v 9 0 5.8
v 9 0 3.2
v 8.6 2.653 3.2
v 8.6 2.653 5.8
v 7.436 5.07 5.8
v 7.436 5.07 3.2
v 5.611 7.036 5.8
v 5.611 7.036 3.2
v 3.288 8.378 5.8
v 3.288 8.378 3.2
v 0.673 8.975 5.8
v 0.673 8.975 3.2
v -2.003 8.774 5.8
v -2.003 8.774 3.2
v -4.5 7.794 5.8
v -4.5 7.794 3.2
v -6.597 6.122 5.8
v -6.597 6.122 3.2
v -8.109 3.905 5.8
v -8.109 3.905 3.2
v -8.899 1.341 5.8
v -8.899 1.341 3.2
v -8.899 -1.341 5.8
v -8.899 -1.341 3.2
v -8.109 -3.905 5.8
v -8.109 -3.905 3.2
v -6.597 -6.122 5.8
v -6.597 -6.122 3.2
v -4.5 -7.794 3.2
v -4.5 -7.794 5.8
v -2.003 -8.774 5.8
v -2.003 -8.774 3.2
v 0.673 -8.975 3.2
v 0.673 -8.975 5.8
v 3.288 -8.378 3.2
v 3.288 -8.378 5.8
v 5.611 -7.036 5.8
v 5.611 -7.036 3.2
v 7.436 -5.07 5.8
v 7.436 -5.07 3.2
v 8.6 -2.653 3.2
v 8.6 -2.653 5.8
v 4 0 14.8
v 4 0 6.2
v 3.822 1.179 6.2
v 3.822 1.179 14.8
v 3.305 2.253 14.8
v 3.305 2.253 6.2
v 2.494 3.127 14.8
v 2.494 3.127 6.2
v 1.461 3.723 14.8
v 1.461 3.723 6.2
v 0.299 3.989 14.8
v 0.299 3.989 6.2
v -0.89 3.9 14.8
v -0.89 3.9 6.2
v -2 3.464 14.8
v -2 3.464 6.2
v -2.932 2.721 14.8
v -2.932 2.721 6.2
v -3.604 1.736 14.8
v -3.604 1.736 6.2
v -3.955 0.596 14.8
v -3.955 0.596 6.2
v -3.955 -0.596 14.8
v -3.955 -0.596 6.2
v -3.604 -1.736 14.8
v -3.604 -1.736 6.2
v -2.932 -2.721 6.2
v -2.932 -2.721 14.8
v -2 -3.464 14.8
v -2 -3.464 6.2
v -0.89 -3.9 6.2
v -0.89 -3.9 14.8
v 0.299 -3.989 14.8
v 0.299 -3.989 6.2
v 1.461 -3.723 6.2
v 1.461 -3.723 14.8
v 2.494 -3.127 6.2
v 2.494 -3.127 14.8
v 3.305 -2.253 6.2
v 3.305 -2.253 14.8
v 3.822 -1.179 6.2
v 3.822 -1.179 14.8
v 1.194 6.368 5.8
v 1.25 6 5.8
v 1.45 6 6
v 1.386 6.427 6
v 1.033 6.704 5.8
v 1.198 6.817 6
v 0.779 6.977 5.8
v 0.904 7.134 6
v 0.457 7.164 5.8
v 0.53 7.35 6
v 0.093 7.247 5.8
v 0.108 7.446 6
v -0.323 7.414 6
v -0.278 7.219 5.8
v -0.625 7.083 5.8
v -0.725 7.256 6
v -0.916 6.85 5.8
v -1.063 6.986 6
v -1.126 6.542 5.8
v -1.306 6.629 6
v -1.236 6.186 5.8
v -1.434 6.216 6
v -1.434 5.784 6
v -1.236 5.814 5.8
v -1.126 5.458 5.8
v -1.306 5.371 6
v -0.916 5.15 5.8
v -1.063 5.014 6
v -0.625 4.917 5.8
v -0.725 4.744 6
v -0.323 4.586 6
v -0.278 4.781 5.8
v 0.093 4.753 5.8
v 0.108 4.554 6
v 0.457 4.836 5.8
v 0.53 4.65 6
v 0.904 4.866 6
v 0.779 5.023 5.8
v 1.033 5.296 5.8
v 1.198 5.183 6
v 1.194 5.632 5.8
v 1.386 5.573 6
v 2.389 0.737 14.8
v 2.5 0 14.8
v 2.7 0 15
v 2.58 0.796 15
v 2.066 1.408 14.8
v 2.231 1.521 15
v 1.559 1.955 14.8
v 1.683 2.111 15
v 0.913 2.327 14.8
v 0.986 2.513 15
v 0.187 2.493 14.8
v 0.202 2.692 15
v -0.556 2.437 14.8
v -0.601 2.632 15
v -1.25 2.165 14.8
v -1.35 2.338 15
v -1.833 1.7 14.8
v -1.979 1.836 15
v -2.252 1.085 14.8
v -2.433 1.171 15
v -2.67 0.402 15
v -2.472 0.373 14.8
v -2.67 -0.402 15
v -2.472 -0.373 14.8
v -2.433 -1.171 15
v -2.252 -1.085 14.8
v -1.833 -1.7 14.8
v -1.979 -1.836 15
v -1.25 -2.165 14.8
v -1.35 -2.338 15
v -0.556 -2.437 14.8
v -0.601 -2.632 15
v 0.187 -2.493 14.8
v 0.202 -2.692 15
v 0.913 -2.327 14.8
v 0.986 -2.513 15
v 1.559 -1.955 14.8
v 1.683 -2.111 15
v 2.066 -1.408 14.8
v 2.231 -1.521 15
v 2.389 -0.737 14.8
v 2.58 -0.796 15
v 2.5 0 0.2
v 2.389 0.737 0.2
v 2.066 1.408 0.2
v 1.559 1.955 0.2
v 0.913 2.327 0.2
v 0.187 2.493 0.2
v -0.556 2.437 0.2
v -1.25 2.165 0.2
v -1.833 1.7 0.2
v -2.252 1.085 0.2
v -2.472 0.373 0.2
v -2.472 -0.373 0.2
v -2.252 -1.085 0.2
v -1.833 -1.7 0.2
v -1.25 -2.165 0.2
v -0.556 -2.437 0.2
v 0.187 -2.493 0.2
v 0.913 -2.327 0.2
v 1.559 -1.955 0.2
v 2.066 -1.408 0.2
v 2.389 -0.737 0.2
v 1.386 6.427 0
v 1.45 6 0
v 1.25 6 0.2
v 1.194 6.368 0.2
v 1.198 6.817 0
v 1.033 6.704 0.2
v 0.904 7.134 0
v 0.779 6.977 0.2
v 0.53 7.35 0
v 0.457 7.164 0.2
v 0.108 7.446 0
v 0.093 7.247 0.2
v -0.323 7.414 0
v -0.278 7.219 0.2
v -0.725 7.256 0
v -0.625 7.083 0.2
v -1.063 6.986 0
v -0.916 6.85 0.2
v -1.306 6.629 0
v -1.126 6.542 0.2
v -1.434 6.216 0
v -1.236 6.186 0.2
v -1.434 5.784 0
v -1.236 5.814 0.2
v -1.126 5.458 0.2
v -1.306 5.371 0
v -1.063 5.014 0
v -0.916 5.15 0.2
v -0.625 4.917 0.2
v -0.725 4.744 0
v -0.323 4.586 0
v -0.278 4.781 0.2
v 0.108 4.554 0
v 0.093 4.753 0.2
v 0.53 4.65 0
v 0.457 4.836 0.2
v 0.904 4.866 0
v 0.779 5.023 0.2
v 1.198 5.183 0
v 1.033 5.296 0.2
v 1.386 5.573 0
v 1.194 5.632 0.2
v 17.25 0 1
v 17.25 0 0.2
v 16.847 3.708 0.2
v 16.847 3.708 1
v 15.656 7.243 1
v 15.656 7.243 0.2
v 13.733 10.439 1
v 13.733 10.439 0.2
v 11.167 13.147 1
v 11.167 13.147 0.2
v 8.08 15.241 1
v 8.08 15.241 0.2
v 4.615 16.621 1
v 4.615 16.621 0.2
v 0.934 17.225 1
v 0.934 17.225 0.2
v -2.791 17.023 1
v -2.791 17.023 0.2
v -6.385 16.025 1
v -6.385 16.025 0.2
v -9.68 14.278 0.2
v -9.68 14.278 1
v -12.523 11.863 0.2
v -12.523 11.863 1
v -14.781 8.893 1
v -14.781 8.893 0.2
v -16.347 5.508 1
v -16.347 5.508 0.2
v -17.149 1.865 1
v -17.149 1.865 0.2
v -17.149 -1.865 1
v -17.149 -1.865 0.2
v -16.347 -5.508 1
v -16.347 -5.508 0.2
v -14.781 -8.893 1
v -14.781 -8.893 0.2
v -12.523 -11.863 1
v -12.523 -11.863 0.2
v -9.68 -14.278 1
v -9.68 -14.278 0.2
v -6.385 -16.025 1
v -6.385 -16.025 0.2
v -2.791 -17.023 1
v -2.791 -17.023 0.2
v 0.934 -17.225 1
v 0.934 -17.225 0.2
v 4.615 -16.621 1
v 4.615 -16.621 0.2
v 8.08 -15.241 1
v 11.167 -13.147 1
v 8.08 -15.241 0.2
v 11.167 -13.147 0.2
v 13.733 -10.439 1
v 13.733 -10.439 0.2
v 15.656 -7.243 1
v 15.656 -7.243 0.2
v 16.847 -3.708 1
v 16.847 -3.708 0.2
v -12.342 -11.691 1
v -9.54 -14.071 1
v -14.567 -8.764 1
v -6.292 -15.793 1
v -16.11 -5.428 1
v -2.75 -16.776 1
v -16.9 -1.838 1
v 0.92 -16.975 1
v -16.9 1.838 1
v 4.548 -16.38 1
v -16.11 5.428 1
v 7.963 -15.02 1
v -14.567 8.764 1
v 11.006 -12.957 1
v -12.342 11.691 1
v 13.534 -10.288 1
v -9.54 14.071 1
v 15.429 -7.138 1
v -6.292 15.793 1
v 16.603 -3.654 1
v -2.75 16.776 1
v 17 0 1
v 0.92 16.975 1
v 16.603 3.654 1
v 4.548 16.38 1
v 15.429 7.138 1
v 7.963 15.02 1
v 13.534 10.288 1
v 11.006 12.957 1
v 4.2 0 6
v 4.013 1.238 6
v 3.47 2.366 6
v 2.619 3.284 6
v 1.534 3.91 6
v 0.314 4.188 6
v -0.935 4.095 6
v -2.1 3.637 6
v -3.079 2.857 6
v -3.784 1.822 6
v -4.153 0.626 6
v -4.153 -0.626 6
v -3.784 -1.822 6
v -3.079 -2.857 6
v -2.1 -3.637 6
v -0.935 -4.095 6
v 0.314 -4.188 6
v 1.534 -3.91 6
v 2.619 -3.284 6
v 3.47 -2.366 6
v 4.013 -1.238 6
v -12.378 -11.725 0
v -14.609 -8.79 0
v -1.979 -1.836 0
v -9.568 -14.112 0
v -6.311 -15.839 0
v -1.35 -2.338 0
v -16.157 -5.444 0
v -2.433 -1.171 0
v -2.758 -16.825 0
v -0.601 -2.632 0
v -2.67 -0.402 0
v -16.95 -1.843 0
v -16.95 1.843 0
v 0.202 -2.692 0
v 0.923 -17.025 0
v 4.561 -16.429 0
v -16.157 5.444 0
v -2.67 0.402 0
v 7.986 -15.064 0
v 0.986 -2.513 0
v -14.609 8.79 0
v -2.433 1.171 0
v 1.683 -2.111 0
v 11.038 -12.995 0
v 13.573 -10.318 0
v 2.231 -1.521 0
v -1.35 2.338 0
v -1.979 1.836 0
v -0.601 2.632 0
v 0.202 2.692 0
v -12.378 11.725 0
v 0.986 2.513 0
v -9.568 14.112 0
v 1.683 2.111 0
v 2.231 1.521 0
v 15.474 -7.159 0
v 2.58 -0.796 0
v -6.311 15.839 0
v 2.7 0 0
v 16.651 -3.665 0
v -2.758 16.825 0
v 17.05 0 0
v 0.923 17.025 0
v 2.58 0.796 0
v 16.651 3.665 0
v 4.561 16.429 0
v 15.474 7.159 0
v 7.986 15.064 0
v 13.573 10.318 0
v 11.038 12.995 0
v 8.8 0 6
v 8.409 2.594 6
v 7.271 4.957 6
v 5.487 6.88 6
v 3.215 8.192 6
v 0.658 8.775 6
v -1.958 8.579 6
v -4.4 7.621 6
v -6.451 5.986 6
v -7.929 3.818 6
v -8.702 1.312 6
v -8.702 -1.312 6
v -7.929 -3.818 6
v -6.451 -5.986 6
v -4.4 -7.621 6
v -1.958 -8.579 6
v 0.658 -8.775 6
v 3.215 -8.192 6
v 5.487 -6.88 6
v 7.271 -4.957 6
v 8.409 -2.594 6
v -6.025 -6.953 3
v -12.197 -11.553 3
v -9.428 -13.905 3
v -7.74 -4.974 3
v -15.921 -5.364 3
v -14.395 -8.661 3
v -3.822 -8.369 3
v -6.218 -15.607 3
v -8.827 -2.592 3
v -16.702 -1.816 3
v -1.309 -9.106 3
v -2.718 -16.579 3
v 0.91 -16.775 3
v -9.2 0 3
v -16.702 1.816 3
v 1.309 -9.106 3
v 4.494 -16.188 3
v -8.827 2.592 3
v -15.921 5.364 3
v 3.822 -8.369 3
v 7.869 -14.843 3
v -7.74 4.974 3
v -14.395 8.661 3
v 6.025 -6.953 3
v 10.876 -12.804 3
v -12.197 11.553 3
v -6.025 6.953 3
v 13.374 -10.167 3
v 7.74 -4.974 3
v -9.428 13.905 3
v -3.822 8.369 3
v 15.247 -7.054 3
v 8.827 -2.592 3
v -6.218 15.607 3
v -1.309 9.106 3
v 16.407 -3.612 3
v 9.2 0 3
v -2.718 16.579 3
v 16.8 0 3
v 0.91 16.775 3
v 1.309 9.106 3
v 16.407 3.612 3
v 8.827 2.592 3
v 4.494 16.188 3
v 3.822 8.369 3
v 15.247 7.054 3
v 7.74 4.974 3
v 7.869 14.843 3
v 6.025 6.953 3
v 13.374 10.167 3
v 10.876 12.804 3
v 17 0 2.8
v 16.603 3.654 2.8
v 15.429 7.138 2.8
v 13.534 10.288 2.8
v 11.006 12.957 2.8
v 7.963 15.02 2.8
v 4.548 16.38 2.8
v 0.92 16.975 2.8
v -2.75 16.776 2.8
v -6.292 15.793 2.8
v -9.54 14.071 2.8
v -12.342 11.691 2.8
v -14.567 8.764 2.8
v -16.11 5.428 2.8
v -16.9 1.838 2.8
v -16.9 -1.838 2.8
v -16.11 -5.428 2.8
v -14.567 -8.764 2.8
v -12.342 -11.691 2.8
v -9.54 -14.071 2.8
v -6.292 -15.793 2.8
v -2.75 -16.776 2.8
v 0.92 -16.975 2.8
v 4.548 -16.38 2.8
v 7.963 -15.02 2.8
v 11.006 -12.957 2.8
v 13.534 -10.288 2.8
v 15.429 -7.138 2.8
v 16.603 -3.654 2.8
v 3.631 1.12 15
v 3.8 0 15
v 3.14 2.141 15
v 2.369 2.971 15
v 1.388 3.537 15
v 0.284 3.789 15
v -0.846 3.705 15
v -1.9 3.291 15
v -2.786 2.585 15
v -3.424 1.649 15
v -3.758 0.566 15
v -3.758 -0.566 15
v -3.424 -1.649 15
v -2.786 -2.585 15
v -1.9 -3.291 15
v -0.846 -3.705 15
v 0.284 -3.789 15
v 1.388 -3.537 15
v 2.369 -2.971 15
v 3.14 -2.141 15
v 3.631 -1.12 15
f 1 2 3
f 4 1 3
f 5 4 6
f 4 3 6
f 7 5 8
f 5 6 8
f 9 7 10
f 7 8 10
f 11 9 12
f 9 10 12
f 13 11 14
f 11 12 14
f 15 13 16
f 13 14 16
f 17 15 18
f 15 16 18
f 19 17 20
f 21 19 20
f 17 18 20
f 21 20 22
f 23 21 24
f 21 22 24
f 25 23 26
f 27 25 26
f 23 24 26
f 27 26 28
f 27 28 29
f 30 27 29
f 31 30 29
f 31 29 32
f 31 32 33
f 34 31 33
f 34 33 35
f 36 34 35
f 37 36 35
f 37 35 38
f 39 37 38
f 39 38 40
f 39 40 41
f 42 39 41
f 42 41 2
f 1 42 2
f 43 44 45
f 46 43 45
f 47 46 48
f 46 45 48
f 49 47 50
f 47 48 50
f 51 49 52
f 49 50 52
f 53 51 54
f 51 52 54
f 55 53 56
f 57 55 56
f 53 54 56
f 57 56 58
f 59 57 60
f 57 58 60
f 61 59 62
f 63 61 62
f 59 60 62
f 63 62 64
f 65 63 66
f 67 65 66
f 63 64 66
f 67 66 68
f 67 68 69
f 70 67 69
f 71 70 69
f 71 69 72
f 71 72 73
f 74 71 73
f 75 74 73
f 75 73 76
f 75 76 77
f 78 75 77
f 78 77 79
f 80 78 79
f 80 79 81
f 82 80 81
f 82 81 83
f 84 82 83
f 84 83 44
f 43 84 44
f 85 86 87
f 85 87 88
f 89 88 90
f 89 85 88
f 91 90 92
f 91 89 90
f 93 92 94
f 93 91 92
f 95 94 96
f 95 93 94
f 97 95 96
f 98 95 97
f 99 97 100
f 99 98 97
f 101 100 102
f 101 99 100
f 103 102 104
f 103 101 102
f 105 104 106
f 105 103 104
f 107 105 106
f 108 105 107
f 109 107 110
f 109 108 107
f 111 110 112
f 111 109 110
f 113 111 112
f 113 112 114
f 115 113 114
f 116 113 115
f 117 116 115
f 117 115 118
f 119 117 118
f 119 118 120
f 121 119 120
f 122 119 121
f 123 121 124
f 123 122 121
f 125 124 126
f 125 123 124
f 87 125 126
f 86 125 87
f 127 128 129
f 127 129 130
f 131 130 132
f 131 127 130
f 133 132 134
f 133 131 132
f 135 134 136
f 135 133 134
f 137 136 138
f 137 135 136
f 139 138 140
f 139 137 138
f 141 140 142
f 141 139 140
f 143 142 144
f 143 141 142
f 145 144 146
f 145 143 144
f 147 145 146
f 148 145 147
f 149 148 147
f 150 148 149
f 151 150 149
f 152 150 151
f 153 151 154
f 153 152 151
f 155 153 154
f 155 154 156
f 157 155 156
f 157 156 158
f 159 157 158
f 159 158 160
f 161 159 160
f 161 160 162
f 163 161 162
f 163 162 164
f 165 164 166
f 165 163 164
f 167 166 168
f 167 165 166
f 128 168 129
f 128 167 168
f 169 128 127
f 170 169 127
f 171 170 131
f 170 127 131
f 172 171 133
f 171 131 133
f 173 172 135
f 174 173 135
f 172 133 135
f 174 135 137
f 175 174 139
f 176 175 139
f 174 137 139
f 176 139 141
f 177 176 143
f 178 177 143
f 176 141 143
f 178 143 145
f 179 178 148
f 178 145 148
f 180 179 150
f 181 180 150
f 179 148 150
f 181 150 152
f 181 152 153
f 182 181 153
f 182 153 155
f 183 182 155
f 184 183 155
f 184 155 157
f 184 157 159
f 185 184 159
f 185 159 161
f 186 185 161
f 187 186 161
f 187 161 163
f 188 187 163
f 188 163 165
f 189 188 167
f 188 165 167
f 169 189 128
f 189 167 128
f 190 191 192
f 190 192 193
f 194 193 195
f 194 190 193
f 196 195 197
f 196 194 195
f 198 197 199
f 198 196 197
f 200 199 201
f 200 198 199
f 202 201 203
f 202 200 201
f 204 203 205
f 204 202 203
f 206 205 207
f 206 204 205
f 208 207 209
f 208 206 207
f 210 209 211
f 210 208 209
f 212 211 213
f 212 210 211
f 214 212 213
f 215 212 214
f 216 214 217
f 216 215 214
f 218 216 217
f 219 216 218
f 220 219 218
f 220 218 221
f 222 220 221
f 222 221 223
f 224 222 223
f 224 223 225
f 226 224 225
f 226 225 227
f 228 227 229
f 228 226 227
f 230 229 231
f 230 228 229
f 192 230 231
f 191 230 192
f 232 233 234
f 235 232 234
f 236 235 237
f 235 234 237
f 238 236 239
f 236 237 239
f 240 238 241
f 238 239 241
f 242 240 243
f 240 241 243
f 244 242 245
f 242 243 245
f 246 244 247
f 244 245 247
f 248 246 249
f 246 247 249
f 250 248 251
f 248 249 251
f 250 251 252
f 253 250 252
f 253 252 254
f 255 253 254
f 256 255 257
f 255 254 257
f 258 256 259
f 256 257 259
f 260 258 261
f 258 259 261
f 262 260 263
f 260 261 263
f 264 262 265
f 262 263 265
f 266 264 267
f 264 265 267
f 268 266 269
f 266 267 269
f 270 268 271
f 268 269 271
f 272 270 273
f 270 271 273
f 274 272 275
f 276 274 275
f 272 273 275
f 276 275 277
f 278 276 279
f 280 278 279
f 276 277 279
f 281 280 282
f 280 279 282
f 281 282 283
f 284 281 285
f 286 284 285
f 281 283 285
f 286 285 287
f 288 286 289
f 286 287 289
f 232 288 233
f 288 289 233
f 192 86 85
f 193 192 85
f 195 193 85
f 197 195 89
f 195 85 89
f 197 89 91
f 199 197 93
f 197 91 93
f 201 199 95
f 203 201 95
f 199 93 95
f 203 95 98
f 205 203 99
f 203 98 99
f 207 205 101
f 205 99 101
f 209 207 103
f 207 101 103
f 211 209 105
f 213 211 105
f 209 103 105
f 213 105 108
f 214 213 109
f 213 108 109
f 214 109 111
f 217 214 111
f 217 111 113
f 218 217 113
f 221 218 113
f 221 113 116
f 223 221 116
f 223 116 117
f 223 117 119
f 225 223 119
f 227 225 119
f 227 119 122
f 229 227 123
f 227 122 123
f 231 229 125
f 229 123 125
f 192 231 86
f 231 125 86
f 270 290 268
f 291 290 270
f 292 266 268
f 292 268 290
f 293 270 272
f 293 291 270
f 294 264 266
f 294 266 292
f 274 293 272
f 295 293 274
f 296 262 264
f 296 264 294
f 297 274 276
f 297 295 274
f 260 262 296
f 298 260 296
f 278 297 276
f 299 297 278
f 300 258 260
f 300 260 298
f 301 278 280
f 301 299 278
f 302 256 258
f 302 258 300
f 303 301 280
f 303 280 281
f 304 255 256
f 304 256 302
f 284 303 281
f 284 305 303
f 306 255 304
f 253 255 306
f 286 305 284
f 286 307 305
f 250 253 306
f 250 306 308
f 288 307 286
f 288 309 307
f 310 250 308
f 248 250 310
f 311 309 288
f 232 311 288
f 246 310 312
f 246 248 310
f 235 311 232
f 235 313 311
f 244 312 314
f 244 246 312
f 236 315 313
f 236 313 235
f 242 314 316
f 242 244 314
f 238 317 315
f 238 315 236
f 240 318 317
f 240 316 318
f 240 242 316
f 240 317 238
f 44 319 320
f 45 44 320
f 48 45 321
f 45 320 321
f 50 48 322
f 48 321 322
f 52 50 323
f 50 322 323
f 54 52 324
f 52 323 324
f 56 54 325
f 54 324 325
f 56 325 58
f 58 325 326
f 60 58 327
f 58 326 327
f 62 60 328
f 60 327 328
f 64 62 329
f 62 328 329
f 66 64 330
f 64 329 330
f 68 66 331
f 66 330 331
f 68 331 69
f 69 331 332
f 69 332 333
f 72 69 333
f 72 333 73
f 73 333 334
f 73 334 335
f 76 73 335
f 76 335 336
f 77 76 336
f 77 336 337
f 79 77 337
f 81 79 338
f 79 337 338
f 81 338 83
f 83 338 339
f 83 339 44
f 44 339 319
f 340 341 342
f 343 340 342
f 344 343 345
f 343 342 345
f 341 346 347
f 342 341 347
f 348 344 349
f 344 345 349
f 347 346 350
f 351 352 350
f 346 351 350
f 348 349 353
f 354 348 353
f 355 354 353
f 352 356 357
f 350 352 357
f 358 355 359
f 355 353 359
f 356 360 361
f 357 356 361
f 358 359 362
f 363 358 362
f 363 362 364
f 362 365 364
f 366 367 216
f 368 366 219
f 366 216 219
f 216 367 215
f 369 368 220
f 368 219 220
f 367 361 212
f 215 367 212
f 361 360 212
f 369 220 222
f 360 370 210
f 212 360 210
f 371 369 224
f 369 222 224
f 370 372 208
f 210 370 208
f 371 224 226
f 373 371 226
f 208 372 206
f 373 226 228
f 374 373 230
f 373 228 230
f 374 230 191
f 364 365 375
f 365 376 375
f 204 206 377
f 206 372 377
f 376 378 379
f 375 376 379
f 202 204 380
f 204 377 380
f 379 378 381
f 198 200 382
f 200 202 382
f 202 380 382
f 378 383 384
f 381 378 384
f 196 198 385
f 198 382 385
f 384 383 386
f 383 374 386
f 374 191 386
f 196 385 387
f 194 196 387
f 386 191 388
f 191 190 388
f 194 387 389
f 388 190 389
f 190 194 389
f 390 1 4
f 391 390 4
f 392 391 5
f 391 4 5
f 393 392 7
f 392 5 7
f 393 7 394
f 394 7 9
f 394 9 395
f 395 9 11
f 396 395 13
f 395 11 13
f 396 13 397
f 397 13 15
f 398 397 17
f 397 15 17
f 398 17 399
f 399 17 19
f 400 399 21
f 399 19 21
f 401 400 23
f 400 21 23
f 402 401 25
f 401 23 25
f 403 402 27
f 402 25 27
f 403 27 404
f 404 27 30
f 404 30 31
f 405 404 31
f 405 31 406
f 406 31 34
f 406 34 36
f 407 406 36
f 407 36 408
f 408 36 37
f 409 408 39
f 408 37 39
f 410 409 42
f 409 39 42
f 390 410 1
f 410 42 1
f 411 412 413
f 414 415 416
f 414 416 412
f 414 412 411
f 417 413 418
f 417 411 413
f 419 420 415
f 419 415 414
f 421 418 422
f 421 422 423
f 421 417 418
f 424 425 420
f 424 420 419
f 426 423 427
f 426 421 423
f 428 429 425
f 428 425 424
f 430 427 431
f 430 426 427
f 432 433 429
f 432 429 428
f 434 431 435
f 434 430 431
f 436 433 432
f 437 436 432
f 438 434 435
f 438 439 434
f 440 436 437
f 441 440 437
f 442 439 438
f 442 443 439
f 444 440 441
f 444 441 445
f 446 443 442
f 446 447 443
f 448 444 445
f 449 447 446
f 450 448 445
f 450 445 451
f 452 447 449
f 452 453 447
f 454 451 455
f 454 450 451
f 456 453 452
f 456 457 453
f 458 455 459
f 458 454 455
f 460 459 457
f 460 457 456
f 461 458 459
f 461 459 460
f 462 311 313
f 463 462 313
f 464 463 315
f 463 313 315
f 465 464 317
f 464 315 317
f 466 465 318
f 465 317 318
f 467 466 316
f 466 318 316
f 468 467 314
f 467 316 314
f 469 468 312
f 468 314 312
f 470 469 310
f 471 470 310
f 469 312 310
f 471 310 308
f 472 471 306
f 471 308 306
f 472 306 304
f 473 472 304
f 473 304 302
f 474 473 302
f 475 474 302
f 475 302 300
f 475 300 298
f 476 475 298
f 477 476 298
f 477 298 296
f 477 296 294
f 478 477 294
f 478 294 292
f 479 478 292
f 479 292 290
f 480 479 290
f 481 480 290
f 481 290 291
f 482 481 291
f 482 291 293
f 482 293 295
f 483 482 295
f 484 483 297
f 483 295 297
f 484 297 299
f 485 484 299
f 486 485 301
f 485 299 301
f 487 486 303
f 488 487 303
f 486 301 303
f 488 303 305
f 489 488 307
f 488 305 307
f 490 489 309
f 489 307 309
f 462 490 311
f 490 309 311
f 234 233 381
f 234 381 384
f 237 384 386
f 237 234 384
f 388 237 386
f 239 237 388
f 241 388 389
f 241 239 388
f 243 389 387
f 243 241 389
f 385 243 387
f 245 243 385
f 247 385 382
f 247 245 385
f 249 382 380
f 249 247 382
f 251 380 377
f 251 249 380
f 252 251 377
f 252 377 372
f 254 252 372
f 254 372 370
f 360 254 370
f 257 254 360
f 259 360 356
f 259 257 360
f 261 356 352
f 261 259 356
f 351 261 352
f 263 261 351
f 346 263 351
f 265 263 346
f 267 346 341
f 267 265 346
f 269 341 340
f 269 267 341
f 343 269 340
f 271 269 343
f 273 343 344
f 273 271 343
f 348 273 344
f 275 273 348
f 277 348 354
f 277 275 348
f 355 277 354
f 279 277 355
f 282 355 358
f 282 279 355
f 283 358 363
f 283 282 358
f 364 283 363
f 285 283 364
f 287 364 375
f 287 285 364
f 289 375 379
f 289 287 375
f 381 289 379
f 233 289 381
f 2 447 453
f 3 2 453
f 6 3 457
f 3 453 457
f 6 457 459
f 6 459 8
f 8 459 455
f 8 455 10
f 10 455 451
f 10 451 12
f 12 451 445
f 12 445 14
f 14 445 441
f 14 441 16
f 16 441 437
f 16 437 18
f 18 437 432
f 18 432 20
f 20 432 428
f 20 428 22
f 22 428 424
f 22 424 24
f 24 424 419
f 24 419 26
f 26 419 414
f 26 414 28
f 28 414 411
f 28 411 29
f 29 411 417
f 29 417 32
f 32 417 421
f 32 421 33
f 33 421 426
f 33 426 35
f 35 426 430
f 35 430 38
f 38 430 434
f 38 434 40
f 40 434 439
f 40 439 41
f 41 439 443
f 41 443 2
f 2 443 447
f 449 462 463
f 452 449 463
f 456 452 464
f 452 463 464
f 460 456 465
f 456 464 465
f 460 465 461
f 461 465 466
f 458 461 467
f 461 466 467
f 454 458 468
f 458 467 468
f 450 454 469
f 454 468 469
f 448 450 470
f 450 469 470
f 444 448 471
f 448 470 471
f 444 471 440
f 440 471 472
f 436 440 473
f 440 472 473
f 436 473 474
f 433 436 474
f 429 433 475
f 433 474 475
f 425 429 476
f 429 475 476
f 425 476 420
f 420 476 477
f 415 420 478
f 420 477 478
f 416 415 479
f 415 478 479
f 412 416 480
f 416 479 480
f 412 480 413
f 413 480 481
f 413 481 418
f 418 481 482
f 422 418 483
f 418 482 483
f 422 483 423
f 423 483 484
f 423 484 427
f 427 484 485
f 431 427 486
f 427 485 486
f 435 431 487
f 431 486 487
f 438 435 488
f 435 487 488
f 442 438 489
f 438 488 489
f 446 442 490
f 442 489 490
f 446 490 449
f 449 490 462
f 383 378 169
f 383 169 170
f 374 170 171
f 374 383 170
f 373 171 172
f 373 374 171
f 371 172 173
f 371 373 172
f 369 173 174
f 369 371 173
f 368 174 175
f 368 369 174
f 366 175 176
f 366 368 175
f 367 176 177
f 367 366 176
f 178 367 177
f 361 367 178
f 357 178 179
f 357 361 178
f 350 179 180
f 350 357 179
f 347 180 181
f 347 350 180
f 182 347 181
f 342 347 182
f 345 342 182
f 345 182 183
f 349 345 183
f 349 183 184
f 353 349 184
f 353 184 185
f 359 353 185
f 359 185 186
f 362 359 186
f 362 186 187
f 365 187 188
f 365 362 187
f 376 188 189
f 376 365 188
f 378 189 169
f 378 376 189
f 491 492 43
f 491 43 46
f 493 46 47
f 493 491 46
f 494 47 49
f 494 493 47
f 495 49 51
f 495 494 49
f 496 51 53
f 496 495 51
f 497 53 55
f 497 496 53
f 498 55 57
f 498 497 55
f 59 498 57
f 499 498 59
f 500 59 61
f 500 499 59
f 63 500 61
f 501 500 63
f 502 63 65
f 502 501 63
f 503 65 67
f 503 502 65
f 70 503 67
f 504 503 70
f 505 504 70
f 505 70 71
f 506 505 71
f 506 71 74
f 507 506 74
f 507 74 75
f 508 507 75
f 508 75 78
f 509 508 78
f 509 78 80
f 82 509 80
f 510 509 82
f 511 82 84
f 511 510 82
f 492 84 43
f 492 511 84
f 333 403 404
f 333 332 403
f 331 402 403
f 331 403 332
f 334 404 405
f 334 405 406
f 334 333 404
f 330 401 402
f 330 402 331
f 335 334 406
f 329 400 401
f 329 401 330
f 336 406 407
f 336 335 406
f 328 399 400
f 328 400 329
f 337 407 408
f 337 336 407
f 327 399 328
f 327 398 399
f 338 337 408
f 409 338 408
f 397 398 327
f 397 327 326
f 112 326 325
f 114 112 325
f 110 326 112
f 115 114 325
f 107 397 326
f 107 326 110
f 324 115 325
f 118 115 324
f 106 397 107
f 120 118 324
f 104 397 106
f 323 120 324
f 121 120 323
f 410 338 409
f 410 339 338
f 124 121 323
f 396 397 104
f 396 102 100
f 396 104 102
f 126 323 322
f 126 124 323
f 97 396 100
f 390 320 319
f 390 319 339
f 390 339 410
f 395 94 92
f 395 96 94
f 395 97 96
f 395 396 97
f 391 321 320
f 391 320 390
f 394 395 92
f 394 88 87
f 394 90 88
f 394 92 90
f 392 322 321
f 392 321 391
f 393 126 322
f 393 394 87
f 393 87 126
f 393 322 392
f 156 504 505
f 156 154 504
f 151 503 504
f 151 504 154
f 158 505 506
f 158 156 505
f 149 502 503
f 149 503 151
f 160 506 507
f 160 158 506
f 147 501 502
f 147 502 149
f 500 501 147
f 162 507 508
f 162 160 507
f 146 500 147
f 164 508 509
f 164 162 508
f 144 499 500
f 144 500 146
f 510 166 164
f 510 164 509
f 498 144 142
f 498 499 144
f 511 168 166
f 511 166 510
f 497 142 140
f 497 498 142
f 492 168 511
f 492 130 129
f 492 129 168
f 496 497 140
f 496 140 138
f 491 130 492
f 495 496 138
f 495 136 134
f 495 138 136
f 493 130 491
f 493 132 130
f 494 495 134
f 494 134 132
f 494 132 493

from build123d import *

# Parameters (mm, degrees)
SKETCH1_R           = 17.25
SKETCH1_R_2         = 17
BOSS_EXTRUDE1_DEPTH = 1
SKETCH1_3_R         = 17
SKETCH1_3_R_2       = 9
BOSS_EXTRUDE2_DEPTH = 3
SKETCH1_4_R         = 9
SKETCH1_4_R_2       = 4
BOSS_EXTRUDE3_DEPTH = 6
SKETCH1_5_R         = 4
BOSS_EXTRUDE4_DEPTH = 15
SKETCH2_R           = 2.5
CUT_EXTRUDE1_DEPTH  = 15
SKETCH3_R           = 1.25
CUT_EXTRUDE2_DEPTH  = 6
CHAMFER1_SIZE       = 0.2


with BuildPart() as part:
    # Sketch1 → Boss-Extrude1 (new body)
    with BuildSketch(Plane.XY):
        Circle(SKETCH1_R)
        Circle(SKETCH1_R_2, mode=Mode.SUBTRACT)
    extrude(amount=BOSS_EXTRUDE1_DEPTH)

    # Sketch1<3> → Boss-Extrude2 (add)
    with BuildSketch(Plane.XY):
        Circle(SKETCH1_3_R)
        Circle(SKETCH1_3_R_2, mode=Mode.SUBTRACT)
    extrude(amount=BOSS_EXTRUDE2_DEPTH)

    # Sketch1<4> → Boss-Extrude3 (add)
    with BuildSketch(Plane.XY):
        Circle(SKETCH1_4_R)
        Circle(SKETCH1_4_R_2, mode=Mode.SUBTRACT)
    extrude(amount=BOSS_EXTRUDE3_DEPTH)

    # Sketch1<5> → Boss-Extrude4 (add)
    with BuildSketch(Plane.XY):
        Circle(SKETCH1_5_R)
    extrude(amount=BOSS_EXTRUDE4_DEPTH)

    # Sketch2 → Cut-Extrude1 (cut)
    with BuildSketch(Plane.XY.offset(15)):
        Circle(SKETCH2_R)
    extrude(amount=-CUT_EXTRUDE1_DEPTH, mode=Mode.SUBTRACT)

    # Sketch3 → Cut-Extrude2 (cut)
    with BuildSketch(Plane.XY.offset(6)):
        with Locations((0, 6)):
            Circle(SKETCH3_R)
    extrude(amount=-CUT_EXTRUDE2_DEPTH, mode=Mode.SUBTRACT)

    # Chamfer1
    chamfer1_edges = [part.edges().sort_by_distance(p)[0] for p in [
        (-4, 0, 6),
        (-9, 0, 6),
        (-4, 0, 15),
        (-2.5, 0, 15),
        (-2.5, 0, 0),
        (-1.25, 6, 0),
        (-1.25, 6, 6),
        (-17.25, 0, 0),
        (-9, 0, 3),
        (-17, 0, 3),
    ]]
    chamfer(chamfer1_edges, length=CHAMFER1_SIZE)


solid = part.part
